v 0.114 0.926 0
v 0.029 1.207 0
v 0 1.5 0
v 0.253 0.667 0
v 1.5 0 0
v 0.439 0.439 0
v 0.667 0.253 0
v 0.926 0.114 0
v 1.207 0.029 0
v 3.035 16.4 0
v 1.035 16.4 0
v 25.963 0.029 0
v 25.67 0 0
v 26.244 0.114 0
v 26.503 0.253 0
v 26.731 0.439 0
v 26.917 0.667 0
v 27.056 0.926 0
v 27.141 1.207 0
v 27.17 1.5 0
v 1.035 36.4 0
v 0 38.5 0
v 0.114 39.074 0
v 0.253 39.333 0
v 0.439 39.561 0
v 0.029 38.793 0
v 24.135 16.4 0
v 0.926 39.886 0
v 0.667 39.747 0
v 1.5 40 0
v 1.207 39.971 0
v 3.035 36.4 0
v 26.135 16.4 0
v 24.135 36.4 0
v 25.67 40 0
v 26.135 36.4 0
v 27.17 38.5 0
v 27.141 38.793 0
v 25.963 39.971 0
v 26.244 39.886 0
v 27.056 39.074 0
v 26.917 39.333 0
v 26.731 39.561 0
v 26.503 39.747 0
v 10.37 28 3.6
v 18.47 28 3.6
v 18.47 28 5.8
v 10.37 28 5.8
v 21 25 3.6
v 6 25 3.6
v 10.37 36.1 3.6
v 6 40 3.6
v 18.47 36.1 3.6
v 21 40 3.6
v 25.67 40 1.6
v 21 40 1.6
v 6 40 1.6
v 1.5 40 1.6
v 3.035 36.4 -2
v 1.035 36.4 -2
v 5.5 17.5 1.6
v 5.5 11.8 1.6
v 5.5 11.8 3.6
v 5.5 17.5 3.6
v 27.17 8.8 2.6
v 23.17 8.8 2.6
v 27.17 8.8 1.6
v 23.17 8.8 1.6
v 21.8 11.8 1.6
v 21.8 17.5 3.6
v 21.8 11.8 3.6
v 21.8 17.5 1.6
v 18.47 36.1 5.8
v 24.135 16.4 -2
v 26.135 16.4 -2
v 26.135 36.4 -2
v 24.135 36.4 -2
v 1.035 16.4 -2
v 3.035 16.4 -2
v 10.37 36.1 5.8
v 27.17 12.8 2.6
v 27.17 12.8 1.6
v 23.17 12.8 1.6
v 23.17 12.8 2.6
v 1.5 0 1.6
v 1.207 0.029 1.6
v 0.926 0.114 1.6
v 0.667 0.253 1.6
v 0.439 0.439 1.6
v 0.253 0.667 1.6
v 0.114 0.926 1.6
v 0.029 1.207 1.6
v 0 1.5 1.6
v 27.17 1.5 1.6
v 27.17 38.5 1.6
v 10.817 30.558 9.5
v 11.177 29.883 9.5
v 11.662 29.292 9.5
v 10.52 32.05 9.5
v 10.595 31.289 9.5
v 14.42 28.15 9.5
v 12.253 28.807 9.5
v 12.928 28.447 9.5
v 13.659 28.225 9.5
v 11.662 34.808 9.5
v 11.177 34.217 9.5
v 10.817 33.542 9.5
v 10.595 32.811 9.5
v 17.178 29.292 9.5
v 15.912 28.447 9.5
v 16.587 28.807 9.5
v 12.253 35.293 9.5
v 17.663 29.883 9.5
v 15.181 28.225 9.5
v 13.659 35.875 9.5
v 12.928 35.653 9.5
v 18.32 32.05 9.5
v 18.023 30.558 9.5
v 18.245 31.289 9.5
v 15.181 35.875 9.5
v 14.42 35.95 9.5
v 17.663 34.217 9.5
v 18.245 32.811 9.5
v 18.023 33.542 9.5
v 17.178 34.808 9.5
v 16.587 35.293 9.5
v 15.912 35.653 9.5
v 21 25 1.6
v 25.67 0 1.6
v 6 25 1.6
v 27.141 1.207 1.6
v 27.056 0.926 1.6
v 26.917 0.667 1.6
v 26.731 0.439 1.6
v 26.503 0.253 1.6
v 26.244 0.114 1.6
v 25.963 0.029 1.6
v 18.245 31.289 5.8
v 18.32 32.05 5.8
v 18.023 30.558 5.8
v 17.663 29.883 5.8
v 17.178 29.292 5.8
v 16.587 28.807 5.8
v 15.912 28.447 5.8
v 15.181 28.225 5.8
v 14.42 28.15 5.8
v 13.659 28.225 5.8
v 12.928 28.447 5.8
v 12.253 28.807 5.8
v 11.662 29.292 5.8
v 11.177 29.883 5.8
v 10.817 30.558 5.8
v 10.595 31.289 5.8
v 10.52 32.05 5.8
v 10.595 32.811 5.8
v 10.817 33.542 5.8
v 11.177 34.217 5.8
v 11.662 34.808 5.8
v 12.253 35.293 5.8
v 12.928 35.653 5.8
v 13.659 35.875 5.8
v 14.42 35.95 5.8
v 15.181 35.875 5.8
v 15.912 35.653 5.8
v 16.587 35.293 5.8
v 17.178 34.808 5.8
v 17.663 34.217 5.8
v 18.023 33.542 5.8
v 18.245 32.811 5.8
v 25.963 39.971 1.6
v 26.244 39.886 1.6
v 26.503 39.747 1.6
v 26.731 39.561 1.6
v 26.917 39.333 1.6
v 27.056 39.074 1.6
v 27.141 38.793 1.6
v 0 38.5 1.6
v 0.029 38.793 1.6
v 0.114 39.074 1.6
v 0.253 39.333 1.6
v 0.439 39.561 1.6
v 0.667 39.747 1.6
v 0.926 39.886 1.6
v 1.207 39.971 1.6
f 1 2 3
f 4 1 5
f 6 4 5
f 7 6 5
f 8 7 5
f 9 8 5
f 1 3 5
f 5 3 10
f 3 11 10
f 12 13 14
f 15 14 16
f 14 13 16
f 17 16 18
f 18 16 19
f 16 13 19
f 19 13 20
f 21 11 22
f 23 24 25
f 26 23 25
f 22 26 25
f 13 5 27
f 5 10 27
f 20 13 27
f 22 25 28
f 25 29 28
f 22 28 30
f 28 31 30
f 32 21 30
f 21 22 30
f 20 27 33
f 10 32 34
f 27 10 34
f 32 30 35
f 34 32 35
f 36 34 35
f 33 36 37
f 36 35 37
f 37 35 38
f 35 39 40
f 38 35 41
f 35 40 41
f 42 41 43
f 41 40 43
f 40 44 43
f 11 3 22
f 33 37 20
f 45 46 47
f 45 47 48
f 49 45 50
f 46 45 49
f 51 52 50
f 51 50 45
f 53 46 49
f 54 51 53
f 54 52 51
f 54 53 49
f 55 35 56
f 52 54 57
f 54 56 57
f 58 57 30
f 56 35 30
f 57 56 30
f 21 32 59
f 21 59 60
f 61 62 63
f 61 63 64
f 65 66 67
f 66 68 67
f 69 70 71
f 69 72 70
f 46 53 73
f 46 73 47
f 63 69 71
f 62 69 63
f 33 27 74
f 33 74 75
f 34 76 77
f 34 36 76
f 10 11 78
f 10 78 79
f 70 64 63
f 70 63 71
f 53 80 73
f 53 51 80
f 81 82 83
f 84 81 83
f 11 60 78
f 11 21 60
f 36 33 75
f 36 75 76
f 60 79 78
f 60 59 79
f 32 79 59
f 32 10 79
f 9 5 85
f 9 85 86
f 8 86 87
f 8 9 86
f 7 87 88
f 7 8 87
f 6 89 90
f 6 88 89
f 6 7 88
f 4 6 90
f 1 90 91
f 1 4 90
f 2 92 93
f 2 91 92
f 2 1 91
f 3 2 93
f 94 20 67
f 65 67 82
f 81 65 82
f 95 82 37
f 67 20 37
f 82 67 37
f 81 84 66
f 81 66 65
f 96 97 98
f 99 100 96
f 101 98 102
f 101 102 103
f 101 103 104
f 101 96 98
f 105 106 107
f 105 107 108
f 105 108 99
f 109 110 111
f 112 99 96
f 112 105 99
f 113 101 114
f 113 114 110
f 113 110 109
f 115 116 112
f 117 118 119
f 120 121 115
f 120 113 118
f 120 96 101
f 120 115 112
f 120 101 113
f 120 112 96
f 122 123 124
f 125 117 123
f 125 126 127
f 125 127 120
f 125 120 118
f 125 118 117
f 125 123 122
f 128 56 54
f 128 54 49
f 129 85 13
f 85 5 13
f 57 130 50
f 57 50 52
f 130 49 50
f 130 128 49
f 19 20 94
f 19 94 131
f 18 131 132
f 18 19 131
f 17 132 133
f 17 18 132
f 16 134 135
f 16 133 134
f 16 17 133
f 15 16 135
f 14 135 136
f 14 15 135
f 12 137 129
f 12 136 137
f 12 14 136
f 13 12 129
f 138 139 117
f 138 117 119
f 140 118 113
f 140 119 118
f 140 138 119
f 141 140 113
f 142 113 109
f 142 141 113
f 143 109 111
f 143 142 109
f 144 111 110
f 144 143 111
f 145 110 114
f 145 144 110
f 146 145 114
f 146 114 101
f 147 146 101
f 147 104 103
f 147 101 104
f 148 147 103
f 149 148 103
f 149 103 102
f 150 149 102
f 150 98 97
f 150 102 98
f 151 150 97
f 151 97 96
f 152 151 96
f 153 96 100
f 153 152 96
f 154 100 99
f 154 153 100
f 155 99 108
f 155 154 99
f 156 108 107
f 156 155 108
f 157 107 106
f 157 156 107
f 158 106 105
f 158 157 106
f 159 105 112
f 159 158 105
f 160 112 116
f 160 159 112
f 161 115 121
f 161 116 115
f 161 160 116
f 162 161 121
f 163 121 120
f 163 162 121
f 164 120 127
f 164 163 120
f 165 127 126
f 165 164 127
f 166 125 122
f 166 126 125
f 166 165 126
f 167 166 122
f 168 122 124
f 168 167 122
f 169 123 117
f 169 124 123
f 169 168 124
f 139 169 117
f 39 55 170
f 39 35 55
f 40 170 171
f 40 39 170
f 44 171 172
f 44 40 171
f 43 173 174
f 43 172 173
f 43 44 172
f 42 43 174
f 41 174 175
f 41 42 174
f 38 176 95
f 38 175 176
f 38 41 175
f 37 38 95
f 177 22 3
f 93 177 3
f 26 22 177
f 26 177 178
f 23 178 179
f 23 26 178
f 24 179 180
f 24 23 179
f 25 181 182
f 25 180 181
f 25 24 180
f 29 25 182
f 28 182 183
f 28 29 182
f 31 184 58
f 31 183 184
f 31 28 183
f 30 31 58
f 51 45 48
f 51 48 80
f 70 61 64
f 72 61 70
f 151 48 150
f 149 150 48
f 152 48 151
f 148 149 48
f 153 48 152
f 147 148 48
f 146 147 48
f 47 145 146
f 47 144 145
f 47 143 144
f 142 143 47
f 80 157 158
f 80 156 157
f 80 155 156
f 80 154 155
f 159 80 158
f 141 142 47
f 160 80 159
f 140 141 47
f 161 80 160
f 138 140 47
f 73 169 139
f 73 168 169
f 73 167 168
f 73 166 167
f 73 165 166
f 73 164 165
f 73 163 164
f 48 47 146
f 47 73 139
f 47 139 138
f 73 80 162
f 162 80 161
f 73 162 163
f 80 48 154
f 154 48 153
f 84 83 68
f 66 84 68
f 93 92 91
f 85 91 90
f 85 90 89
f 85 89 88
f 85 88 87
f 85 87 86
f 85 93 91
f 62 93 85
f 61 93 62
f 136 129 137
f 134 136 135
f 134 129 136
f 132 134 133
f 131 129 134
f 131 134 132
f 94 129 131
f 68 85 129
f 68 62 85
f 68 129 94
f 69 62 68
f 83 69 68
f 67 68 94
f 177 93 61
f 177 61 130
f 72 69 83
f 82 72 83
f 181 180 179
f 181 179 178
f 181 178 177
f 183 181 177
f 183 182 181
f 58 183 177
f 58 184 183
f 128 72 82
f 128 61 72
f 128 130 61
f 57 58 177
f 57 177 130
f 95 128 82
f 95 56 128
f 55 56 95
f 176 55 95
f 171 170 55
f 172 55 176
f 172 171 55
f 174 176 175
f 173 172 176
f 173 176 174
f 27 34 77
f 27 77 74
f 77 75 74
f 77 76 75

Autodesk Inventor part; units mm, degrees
ref_plane "YZ Plane" through (0, 0, 0) normal (1, 0, 0) x (0, 1, 0)
ref_plane "XZ Plane" through (0, 0, 0) normal (0, 1, 0) x (-1, 0, 0)
ref_plane "XY Plane" through (0, 0, 0) normal (0, 0, 1) x (1, 0, 0)
sketch "Sketch1" plane through (0, 0, 0) normal (0, 0, 1) x (1, 0, 0)
  line L0 (1.5, 0) -> (25.67, 0)
  line L1 (27.17, 1.5) -> (27.17, 38.5)
  line L2 (25.67, 40) -> (1.5, 40)
  line L3 (0, 38.5) -> (0, 1.5)
  arc A0 (1.5, 40) -> (0, 38.5) centre (1.5, 38.5) ccw
  arc A1 (27.17, 38.5) -> (25.67, 40) centre (25.67, 38.5) ccw
  arc A2 (25.67, 0) -> (27.17, 1.5) centre (25.67, 1.5) ccw
  arc A3 (0, 1.5) -> (1.5, 0) centre (1.5, 1.5) ccw
  point P0 (0, 0)
  point P1 (27.17, 40)
  point P2 (0, 40)
  dimension "d0" = 40
  dimension "d1" = 27.17
  dimension "d2" = 1.5
extrude "Extrusion1" add sketch "Sketch1" along normal blind 1.6
sketch "Sketch2" plane through (0, 0, 1.6) normal (0, 0, 1) x (1, 0, 0)
  line L0 (25.67, 40) -> (1.5, 40) projected
  line L1 (6, 40) -> (21, 40)
  line L2 (21, 40) -> (21, 25)
  line L3 (21, 25) -> (6, 25)
  line L4 (6, 25) -> (6, 40)
  line L5 (0, 38.5) -> (0, 1.5) projected
  line L6 (5.5, 17.5) -> (21.8, 17.5)
  line L7 (21.8, 17.5) -> (21.8, 11.8)
  line L8 (21.8, 11.8) -> (5.5, 11.8)
  line L9 (5.5, 11.8) -> (5.5, 17.5)
  line L10 (1.5, 0) -> (25.67, 0) projected
  line L11 (27.17, 1.5) -> (27.17, 38.5) projected
  line L12 (27.17, 12.8) -> (23.17, 12.8)
  line L13 (23.17, 12.8) -> (23.17, 8.8)
  line L14 (23.17, 8.8) -> (27.17, 8.8)
  line L15 (27.17, 8.8) -> (27.17, 12.8)
  point P0 (0, 0)
  dimension "d5" = 15
  dimension "d6" = 15
  dimension "d7" = 6
  dimension "d8" = 5.7
  dimension "d9" = 16.3
  dimension "d10" = 5.5
  dimension "d11" = 11.8
  dimension "d12" = 4
  dimension "d13" = 4
  dimension "d14" = 8.8
extrude "Extrusion2" add sketch "Sketch2" along normal blind 2 contours L2 L3 L4 L0
extrude "Extrusion3" add sketch "Sketch2" along normal blind 2 contours L6 L7 L8 L9
extrude "Extrusion4" add sketch "Sketch2" along normal blind 1 contours L14 L13 L12 L11
sketch "Sketch3" plane through (0, 0, 3.6) normal (0, 0, 1) x (1, 0, 0)
  line L0 (10.37, 36.1) -> (18.47, 36.1)
  line L1 (18.47, 36.1) -> (18.47, 28)
  line L2 (18.47, 28) -> (10.37, 28)
  line L3 (10.37, 28) -> (10.37, 36.1)
  line L4 (25.67, 40) -> (21, 40) projected
  line L5 (27.17, 12.8) -> (27.17, 38.5) projected
  point P0 (0, 0)
  dimension "d21" = 8.1
  dimension "d22" = 8.1
  dimension "d23" = 3.9
  dimension "d24" = 8.7
extrude "Extrusion5" add sketch "Sketch3" along normal blind 2.2
sketch "Sketch4" plane through (0, 0, 5.8) normal (0, 0, 1) x (1, 0, 0)
  circle A0 centre (14.42, 32.05) radius 3.9
  circle A1 centre (14.42, 32.05) radius 4.05
  line L0 (18.47, 36.1) -> (10.37, 36.1) projected
  line L1 (18.47, 28) -> (18.47, 36.1) projected
  point P0 (0, 0)
  dimension "d27" = 7.8
extrude "Extrusion6" add sketch "Sketch4" along normal blind 3.7 contours A0
sketch "Sketch5" plane through (0, 0, 0) normal (0, 0, -1) x (-1, 0, 0)
  line L0 (-1.035, 16.4) -> (-3.035, 16.4)
  line L1 (-3.035, 16.4) -> (-3.035, 36.4)
  line L2 (-3.035, 36.4) -> (-1.035, 36.4)
  line L3 (-1.035, 36.4) -> (-1.035, 16.4)
  line L4 (-24.135, 16.4) -> (-26.135, 16.4)
  line L5 (-26.135, 16.4) -> (-26.135, 36.4)
  line L6 (-26.135, 36.4) -> (-24.135, 36.4)
  line L7 (-24.135, 36.4) -> (-24.135, 16.4)
  line L8 (0, 38.5) -> (0, 1.5) projected
  line L9 (-27.17, 1.5) -> (-27.17, 38.5) projected
  line L10 (-1.5, 0) -> (-25.67, 0) projected
  line L11 (-25.67, 40) -> (-1.5, 40) projected
  point P0 (0, 0)
  dimension "d30" = 25.1
  dimension "d31" = 2
  dimension "d32" = 1.035
  dimension "d33" = 1.035
  dimension "d36" = 3.6
  dimension "d39" = 20
extrude "Extrusion7" add sketch "Sketch5" along normal blind 2
properties part number "esp32-cam-sp"
